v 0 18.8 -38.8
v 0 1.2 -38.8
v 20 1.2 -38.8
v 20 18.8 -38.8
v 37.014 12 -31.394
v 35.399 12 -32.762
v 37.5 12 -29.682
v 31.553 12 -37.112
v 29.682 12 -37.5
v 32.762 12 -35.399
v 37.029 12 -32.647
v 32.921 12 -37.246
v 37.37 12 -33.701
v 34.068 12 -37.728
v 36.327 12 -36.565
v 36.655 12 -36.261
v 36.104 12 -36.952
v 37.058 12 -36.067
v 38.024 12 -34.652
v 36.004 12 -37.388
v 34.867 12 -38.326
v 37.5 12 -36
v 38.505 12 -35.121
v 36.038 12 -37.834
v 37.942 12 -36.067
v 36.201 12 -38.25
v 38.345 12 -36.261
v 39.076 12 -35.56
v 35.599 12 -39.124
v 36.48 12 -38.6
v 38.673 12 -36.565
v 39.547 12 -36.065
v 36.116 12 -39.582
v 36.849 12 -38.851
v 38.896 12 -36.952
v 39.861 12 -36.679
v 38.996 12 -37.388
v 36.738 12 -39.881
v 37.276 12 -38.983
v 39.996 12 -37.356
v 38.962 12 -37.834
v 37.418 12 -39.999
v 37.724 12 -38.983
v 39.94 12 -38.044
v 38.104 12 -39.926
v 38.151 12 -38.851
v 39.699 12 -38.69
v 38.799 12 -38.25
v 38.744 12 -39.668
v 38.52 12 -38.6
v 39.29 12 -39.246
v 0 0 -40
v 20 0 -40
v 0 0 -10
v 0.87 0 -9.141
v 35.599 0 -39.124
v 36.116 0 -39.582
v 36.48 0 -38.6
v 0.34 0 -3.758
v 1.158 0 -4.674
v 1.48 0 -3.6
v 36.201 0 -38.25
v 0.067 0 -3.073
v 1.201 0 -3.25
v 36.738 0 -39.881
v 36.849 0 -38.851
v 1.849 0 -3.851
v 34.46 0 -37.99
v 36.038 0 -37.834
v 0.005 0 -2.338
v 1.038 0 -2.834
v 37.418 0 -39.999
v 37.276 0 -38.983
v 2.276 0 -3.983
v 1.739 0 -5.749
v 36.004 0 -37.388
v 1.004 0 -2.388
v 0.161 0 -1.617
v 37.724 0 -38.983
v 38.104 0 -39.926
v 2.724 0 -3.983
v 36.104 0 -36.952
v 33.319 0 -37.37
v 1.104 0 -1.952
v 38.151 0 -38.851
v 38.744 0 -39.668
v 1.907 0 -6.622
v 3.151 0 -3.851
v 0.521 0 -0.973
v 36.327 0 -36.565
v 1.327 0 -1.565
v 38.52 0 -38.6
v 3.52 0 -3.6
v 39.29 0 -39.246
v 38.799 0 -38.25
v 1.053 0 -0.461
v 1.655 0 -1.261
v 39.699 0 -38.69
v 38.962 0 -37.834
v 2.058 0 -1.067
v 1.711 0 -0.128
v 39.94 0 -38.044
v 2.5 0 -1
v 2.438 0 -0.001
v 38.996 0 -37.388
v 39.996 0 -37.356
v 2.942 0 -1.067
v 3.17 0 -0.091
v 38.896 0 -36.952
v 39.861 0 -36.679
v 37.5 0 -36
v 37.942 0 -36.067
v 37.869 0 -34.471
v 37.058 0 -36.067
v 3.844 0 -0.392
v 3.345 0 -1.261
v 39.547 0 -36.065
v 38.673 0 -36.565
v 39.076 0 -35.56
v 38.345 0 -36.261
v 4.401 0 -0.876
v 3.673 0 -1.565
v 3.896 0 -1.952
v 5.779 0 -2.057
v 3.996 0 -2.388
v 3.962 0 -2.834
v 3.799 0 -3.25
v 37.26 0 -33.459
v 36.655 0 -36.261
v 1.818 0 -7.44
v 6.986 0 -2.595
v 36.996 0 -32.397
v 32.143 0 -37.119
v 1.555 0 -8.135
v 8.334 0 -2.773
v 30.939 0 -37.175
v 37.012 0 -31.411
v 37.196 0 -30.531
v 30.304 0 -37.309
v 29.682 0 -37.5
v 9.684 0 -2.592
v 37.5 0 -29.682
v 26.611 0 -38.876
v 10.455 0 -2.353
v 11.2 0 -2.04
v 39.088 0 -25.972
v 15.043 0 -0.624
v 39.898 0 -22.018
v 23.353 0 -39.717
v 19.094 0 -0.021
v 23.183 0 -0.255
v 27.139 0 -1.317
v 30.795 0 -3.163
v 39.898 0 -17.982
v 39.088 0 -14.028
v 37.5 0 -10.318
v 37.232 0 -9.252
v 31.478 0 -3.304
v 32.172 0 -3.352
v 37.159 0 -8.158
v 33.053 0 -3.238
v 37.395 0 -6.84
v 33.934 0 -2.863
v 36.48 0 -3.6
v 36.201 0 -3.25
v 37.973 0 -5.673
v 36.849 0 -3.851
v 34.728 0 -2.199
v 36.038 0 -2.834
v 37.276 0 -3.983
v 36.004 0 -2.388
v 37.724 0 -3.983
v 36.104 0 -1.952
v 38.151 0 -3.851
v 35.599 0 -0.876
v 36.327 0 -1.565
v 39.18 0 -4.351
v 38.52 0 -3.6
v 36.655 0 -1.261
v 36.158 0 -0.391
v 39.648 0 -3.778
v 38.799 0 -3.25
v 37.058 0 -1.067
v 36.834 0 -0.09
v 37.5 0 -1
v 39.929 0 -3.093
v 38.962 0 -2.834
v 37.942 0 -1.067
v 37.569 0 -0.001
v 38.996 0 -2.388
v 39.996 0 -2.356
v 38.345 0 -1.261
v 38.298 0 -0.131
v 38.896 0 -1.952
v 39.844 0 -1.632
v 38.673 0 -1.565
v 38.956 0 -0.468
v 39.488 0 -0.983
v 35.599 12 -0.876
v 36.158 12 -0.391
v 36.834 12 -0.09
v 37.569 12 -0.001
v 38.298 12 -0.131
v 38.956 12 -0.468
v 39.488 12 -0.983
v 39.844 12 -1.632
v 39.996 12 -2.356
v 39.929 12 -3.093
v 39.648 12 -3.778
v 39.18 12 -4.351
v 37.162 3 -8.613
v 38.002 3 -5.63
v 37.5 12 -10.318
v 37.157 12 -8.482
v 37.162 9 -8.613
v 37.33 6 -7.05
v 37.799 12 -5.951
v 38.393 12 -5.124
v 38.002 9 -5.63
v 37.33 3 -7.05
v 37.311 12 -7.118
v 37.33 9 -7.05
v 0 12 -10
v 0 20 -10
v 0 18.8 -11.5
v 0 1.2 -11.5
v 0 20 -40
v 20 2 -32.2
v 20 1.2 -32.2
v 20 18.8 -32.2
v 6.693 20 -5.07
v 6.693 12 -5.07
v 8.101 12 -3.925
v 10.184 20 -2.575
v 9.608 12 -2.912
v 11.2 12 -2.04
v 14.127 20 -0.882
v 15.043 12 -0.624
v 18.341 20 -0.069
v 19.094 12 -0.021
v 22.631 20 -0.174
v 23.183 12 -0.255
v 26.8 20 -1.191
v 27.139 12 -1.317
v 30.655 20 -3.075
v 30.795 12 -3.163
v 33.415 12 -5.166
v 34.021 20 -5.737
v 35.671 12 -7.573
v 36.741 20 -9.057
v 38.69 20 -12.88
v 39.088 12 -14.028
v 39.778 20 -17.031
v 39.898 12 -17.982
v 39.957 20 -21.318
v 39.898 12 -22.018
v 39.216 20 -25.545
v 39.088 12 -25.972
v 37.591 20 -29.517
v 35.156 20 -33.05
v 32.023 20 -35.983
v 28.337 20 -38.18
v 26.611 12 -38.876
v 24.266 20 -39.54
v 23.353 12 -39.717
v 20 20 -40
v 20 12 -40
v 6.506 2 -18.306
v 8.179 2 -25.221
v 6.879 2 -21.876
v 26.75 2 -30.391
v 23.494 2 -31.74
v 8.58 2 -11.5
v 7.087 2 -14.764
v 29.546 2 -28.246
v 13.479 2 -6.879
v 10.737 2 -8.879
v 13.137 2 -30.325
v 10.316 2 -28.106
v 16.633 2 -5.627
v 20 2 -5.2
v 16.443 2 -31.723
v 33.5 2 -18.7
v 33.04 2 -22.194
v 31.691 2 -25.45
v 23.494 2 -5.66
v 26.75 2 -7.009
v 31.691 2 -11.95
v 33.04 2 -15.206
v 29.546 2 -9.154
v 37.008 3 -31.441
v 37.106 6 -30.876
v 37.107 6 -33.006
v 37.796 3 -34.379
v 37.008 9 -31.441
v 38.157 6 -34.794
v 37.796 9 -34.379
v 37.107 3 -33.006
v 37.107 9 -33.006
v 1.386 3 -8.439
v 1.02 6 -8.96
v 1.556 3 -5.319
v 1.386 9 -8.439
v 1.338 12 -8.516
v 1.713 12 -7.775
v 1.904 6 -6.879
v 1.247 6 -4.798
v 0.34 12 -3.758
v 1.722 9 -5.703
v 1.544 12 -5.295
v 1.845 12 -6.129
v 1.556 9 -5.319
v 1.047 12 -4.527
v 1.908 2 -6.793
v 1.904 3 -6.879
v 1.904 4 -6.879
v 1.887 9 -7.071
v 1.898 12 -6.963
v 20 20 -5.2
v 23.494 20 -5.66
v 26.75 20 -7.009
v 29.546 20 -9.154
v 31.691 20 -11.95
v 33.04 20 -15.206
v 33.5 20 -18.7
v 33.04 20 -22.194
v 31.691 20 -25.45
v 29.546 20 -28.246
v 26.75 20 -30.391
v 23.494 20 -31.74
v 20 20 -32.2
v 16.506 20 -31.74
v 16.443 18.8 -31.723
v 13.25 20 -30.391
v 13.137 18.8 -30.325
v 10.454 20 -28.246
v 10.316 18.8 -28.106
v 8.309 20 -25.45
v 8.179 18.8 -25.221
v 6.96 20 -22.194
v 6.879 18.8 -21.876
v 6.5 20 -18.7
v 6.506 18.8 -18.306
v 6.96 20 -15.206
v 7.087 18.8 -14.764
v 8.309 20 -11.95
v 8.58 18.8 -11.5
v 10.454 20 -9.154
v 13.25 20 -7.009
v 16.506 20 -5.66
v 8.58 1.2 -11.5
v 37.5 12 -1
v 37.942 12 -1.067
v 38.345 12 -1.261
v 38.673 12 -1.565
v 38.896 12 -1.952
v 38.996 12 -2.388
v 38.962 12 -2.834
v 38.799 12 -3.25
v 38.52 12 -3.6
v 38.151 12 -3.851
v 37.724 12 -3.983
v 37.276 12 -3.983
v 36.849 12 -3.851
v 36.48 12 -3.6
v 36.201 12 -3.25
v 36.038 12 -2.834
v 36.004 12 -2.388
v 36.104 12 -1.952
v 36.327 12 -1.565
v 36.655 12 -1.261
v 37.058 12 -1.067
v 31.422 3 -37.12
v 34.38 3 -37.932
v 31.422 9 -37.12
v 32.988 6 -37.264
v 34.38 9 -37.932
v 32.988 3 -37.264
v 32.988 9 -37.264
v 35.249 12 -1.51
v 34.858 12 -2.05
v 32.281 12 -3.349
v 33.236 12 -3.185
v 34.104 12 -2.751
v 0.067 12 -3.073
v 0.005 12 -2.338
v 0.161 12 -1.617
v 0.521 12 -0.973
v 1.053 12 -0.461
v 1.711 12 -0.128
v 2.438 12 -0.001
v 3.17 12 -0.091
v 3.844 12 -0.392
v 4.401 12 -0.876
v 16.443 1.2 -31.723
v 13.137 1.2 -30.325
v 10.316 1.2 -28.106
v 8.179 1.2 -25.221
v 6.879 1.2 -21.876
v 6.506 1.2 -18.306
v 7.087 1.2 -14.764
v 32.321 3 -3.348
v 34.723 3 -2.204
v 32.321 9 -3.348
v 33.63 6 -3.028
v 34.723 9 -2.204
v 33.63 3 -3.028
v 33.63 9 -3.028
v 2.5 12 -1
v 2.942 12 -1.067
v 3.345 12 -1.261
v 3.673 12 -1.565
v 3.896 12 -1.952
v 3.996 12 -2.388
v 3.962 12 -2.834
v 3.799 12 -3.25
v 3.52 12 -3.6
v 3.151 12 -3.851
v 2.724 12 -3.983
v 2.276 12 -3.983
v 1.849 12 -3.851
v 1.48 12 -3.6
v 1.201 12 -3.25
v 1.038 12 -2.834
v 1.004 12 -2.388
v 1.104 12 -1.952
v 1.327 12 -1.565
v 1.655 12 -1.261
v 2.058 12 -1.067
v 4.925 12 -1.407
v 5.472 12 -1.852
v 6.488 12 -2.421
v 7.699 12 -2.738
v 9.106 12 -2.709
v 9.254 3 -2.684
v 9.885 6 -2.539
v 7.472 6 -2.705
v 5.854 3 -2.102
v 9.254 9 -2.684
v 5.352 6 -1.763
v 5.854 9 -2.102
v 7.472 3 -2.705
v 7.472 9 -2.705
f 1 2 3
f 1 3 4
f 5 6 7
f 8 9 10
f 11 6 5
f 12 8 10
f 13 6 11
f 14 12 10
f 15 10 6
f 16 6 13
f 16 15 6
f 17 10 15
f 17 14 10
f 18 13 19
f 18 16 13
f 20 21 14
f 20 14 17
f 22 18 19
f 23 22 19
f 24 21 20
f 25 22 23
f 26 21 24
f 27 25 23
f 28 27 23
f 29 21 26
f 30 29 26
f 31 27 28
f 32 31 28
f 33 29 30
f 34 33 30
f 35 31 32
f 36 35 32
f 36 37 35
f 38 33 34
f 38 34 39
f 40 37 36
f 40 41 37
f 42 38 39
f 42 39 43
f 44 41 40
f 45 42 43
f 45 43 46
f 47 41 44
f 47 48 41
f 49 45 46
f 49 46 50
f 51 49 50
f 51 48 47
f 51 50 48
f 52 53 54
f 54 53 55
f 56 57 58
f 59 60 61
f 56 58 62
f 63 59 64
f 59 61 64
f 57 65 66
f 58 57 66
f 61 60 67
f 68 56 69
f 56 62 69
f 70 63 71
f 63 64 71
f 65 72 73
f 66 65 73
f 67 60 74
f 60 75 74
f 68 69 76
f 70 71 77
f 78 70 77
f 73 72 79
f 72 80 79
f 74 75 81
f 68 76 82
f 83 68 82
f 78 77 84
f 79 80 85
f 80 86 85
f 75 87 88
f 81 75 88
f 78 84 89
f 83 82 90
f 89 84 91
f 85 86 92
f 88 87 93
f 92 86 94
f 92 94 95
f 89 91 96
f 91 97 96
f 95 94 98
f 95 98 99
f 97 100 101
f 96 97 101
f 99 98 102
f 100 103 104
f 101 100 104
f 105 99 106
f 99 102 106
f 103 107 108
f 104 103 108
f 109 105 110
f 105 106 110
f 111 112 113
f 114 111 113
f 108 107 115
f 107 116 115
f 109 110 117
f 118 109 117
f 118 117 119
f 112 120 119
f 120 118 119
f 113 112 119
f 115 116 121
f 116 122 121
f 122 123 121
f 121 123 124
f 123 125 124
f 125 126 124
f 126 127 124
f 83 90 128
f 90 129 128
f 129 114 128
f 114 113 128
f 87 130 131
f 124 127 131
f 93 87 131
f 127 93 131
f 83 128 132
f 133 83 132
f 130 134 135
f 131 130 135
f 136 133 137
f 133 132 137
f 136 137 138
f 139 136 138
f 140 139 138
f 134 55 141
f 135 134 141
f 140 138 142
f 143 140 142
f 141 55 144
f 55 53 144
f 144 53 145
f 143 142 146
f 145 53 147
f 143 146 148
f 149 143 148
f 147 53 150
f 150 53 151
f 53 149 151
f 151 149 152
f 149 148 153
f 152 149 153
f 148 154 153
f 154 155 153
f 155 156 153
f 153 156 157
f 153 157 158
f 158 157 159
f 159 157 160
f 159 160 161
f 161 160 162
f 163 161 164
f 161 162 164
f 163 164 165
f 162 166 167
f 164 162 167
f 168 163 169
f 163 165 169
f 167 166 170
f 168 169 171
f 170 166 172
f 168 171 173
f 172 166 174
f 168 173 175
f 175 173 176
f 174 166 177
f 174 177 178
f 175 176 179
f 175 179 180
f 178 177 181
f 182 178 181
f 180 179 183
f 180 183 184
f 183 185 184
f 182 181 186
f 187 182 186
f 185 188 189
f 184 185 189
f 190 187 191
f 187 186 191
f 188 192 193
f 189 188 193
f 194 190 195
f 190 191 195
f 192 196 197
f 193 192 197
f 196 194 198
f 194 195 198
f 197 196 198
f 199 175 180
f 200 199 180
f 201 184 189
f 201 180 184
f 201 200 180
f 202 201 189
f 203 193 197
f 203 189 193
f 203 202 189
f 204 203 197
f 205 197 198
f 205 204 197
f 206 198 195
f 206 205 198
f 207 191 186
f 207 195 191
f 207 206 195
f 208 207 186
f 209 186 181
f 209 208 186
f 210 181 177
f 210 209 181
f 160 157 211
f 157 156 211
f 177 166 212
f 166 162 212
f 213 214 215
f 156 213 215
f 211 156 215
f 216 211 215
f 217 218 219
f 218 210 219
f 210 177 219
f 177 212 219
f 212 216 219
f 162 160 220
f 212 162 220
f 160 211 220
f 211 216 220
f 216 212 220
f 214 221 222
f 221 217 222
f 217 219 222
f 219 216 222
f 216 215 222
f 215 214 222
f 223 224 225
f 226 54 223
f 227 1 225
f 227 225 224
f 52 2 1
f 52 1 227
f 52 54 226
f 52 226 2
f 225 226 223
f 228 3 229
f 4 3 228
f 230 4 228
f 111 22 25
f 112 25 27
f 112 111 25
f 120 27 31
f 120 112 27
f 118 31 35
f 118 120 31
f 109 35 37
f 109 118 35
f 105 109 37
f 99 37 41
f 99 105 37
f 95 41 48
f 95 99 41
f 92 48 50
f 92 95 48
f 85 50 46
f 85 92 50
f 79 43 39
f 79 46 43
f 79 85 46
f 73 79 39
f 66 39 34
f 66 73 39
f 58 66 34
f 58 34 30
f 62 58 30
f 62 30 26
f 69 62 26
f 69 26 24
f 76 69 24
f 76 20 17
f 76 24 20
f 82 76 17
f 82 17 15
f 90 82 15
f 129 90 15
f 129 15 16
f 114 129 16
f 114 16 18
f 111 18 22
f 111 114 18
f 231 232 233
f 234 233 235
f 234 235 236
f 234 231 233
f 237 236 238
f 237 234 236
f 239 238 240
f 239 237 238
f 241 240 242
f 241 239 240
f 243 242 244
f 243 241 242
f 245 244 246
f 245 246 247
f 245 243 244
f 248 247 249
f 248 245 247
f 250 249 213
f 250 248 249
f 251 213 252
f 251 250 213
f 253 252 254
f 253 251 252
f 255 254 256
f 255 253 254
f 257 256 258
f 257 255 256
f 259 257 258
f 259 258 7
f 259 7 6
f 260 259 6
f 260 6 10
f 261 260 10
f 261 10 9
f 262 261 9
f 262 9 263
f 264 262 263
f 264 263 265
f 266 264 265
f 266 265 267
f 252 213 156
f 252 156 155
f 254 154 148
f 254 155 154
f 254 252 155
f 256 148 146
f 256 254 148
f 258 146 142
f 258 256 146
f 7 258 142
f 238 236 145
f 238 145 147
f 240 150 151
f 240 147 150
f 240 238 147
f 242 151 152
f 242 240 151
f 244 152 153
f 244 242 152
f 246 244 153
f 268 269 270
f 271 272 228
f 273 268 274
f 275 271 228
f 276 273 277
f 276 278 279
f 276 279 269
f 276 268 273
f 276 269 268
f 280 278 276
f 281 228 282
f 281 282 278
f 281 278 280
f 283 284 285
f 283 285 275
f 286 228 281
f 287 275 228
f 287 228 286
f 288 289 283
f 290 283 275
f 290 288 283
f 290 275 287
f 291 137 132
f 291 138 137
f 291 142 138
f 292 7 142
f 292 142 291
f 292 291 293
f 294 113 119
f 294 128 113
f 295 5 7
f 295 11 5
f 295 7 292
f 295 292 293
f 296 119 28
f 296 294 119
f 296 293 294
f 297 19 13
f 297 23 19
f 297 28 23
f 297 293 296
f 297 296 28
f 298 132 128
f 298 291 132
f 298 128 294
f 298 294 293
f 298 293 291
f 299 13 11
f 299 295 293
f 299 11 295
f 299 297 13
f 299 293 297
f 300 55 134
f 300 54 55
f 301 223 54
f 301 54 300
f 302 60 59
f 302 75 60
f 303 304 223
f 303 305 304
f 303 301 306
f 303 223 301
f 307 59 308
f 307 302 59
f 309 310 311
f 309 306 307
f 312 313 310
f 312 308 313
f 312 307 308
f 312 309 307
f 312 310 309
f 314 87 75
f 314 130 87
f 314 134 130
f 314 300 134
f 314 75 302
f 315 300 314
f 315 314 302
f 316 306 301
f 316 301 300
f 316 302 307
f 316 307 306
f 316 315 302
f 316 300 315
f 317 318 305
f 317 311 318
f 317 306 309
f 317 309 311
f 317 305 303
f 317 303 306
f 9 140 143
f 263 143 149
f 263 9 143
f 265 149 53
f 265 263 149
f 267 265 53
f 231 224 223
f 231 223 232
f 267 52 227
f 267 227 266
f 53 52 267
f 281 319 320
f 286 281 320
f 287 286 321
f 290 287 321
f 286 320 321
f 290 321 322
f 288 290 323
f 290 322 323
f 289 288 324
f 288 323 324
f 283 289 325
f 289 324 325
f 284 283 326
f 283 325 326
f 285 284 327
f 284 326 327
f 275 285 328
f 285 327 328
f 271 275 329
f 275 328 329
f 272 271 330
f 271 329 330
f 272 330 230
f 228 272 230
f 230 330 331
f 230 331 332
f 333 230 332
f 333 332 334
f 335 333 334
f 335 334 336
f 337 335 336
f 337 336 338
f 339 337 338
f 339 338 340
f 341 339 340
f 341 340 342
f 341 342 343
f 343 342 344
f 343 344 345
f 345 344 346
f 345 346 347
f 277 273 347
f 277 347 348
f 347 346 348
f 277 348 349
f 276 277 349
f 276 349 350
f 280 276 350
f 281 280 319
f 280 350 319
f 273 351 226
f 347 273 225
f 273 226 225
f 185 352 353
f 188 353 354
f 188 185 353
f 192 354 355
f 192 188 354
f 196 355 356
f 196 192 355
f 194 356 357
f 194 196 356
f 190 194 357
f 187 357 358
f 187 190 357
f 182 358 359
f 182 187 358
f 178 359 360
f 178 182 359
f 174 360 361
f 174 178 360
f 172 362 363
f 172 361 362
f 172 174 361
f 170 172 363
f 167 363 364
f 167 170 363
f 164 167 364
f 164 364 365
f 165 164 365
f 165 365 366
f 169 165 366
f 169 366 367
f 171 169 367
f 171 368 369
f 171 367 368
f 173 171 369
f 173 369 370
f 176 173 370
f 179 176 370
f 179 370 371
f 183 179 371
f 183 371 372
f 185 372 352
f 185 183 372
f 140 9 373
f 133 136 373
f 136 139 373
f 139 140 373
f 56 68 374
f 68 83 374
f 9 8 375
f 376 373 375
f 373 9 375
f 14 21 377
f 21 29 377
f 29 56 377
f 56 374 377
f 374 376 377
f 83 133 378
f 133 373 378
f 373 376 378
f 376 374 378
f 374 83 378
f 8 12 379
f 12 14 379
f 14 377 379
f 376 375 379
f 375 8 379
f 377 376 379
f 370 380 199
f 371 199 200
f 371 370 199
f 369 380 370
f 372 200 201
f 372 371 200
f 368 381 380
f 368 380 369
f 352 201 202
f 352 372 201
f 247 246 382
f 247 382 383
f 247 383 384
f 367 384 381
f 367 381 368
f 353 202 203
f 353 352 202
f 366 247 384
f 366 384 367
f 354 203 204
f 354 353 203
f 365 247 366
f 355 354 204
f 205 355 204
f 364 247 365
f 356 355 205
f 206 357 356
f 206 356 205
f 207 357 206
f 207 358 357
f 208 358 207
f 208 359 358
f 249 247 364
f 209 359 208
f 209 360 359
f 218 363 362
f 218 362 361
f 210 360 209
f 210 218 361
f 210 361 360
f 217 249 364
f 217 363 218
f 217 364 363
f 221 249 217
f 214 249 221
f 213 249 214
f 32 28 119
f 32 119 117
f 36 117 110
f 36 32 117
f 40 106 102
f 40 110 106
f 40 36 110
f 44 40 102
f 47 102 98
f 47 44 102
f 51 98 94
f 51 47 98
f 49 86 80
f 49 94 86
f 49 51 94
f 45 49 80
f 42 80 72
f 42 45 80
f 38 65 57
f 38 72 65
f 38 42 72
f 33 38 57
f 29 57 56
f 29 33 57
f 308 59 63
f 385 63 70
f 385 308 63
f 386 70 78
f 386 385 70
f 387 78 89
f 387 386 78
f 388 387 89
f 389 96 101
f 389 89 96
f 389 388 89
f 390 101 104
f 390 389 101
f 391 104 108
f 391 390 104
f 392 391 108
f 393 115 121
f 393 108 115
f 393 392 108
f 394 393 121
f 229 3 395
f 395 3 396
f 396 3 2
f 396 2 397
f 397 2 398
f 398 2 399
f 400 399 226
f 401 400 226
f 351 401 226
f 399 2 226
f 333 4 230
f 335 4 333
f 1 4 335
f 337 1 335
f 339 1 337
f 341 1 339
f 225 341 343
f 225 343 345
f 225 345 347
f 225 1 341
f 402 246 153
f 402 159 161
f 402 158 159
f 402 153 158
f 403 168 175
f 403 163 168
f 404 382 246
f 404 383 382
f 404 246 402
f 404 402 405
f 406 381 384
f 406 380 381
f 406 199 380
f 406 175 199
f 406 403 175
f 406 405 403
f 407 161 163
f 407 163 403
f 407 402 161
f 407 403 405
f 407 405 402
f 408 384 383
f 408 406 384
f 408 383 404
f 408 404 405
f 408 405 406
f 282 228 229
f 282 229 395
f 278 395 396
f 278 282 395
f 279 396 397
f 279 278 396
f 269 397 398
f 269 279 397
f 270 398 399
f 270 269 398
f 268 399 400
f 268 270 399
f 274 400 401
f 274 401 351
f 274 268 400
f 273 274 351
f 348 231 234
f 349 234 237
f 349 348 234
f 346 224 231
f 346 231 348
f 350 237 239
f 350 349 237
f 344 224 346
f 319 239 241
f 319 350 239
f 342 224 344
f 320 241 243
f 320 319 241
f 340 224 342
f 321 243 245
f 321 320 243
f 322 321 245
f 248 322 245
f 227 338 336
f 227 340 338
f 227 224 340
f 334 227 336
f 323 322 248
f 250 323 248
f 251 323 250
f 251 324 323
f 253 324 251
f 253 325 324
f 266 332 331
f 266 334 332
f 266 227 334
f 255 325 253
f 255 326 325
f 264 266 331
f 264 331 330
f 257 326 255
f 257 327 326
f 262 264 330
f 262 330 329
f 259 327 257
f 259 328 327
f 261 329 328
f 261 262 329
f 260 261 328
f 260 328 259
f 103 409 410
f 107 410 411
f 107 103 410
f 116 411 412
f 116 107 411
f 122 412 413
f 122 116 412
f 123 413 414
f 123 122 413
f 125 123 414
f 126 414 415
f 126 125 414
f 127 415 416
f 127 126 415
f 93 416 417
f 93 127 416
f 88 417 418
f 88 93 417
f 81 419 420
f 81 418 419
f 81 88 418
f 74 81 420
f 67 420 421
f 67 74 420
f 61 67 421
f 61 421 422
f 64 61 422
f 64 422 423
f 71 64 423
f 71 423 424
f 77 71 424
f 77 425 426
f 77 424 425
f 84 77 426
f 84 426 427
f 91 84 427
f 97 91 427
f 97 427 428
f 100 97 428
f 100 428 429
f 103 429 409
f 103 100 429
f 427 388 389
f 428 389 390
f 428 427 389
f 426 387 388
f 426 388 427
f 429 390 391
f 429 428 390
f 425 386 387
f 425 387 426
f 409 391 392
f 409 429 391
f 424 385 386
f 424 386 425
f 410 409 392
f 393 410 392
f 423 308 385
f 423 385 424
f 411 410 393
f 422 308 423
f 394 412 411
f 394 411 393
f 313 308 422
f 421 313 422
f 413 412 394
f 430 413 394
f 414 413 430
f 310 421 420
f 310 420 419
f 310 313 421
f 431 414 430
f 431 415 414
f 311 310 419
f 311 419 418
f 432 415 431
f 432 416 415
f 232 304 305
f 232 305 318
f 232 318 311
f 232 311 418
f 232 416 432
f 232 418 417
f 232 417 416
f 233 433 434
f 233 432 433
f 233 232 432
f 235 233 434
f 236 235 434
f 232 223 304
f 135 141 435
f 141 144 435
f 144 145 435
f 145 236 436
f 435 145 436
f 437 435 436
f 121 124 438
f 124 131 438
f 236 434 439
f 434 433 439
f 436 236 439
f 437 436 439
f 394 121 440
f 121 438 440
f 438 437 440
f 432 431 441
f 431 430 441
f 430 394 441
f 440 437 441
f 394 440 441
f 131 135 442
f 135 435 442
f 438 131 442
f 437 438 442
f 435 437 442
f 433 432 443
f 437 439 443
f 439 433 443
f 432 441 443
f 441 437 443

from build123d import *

# Parameters (mm, degrees)
SKETCH_1_W          = 40
SKETCH_1_H          = 40
SKETCH_1_R          = 1.5
EXTRUDE_1_DEPTH     = 20
SKETCH_2_W          = 27.3
SKETCH_2_H          = 17.6
CUT_EXTRUDE_1_DEPTH = 20
SKETCH_3_R          = 13.5
CUT_EXTRUDE_2_DEPTH = 18
SKETCH_4_OUTSIDE_W  = 54
SKETCH_4_OUTSIDE_H  = 54
CUT_EXTRUDE_3_DEPTH = 8
SKETCH_5_OUTSIDE_W  = 54
SKETCH_5_OUTSIDE_H  = 54
CUT_EXTRUDE_4_DEPTH = 58.827329179
SKETCH_6_R          = 13.5
EXTRUDE_2_DEPTH     = 2


with BuildPart() as part:
    # 草图1 → 凸台-拉伸1 (new body)
    with BuildSketch(Plane(origin=(0, 0, 0), x_dir=(1, 0, 0), z_dir=(0, 1, 0))):
        with Locations((20, 20)):
            Rectangle(SKETCH_1_W, SKETCH_1_H)
        with Locations(Location((2.5, 2.5, 0), (0, 0, 270))):
            Circle(SKETCH_1_R, mode=Mode.SUBTRACT)
        with Locations(Location((37.5, 2.5, 0), (0, 0, 270))):
            Circle(SKETCH_1_R, mode=Mode.SUBTRACT)
        with Locations(Location((37.5, 37.5, 0), (0, 0, 270))):
            Circle(SKETCH_1_R, mode=Mode.SUBTRACT)
    extrude(amount=EXTRUDE_1_DEPTH)

    # 草图2 → 切除-拉伸1 (cut)
    with BuildSketch(Plane.ZY):
        with Locations((-25.15, 10)):
            Rectangle(SKETCH_2_W, SKETCH_2_H)
    extrude(amount=-CUT_EXTRUDE_1_DEPTH, mode=Mode.SUBTRACT)

    # 草图3 → 切除-拉伸2 (cut)
    with BuildSketch(Plane(origin=(0, 20, 0), x_dir=(1, 0, 0), z_dir=(0, 1, 0))):
        with Locations(Location((20, 18.7, 0), (0, 0, 270))):
            Circle(SKETCH_3_R)
    extrude(amount=-CUT_EXTRUDE_2_DEPTH, mode=Mode.SUBTRACT)

    # 草图4 outside → 切除-拉伸3 (cut)
    with BuildSketch(Plane(origin=(0, 20, 0), x_dir=(1, 0, 0), z_dir=(0, 1, 0))):
        with Locations((20, 20)):
            Rectangle(SKETCH_4_OUTSIDE_W, SKETCH_4_OUTSIDE_H)
        with BuildLine():
            Line((20, 40), (0, 40))
            Line((0, 40), (0, 20))
            Line((0, 20), (0, 10))
            Line((0, 10), (6.692582543, 5.069740772))
            ThreePointArc((6.692582543, 5.069740772), (38.689638634, 12.879788787), (20, 40))
        make_face(mode=Mode.SUBTRACT)
    extrude(amount=-CUT_EXTRUDE_3_DEPTH, mode=Mode.SUBTRACT)

    # 草图5 outside → 切除-拉伸4 (cut, through all)
    with BuildSketch(Plane(origin=(0, 12, 0), x_dir=(1, 0, 0), z_dir=(0, 1, 0))):
        with Locations((20, 20)):
            Rectangle(SKETCH_5_OUTSIDE_W, SKETCH_5_OUTSIDE_H)
        with BuildLine():
            Line((0, 40), (0, 10))
            add(Edge.make_bspline(
                [(0, 10), (3.638806933, 6.878431862), (0.339826236, 3.758431289)],
                knots=[0, 0, 0, 1, 1, 1], degree=2))
            ThreePointArc((0.339826236, 3.758431289), (1.052952689, 0.461359748), (4.40068463, 0.875993246))
            add(Edge.make_bspline(
                [(11.200276687, 2.039908975), (7.143896711, 3.952452975), (4.40068463, 0.875993246)],
                knots=[0, 0, 0, 1, 1, 1], degree=2))
            ThreePointArc((11.200276687, 2.039908975), (21.144719324, 0.032786432), (30.794624305, 3.163251914))
            add(Edge.make_bspline(
                [(30.794624305, 3.163251914), (34.063948175, 4.035889324), (35.59931537, 0.875993246)],
                knots=[0, 0, 0, 1, 1, 1], degree=2))
            ThreePointArc((35.59931537, 0.875993246), (39.241156707, 0.706017469), (39.180073086, 4.351311542))
            add(Edge.make_bspline(
                [(37.5, 10.317541634), (36.319762019, 6.765651399), (39.180073086, 4.351311542)],
                knots=[0, 0, 0, 1, 1, 1], degree=2))
            ThreePointArc((37.5, 10.317541634), (40, 20), (37.5, 29.682458366))
            add(Edge.make_bspline(
                [(37.5, 29.682458366), (35.925102207, 33.39107959), (39.07643597, 35.559677957)],
                knots=[0, 0, 0, 1, 1, 1], degree=2))
            ThreePointArc((39.07643597, 35.559677957), (39.289523468, 39.245739315), (35.59931537, 39.124006754))
            add(Edge.make_bspline(
                [(29.682458366, 37.5), (33.334347744, 36.215512873), (35.59931537, 39.124006754)],
                knots=[0, 0, 0, 1, 1, 1], degree=2))
            ThreePointArc((29.682458366, 37.5), (25, 39.364916731), (20, 40))
            Line((20, 40), (0, 40))
        make_face(mode=Mode.SUBTRACT)
    extrude(amount=-CUT_EXTRUDE_4_DEPTH, mode=Mode.SUBTRACT)

    # 草图6 → 凸台-拉伸2 (add)
    with BuildSketch(Plane(origin=(0, 2, 0), x_dir=(1, 0, 0), z_dir=(0, 1, 0))):
        with Locations(Location((20, 18.7, 0), (0, 0, 270))):
            Circle(SKETCH_6_R)
    extrude(amount=-EXTRUDE_2_DEPTH)


solid = part.part
